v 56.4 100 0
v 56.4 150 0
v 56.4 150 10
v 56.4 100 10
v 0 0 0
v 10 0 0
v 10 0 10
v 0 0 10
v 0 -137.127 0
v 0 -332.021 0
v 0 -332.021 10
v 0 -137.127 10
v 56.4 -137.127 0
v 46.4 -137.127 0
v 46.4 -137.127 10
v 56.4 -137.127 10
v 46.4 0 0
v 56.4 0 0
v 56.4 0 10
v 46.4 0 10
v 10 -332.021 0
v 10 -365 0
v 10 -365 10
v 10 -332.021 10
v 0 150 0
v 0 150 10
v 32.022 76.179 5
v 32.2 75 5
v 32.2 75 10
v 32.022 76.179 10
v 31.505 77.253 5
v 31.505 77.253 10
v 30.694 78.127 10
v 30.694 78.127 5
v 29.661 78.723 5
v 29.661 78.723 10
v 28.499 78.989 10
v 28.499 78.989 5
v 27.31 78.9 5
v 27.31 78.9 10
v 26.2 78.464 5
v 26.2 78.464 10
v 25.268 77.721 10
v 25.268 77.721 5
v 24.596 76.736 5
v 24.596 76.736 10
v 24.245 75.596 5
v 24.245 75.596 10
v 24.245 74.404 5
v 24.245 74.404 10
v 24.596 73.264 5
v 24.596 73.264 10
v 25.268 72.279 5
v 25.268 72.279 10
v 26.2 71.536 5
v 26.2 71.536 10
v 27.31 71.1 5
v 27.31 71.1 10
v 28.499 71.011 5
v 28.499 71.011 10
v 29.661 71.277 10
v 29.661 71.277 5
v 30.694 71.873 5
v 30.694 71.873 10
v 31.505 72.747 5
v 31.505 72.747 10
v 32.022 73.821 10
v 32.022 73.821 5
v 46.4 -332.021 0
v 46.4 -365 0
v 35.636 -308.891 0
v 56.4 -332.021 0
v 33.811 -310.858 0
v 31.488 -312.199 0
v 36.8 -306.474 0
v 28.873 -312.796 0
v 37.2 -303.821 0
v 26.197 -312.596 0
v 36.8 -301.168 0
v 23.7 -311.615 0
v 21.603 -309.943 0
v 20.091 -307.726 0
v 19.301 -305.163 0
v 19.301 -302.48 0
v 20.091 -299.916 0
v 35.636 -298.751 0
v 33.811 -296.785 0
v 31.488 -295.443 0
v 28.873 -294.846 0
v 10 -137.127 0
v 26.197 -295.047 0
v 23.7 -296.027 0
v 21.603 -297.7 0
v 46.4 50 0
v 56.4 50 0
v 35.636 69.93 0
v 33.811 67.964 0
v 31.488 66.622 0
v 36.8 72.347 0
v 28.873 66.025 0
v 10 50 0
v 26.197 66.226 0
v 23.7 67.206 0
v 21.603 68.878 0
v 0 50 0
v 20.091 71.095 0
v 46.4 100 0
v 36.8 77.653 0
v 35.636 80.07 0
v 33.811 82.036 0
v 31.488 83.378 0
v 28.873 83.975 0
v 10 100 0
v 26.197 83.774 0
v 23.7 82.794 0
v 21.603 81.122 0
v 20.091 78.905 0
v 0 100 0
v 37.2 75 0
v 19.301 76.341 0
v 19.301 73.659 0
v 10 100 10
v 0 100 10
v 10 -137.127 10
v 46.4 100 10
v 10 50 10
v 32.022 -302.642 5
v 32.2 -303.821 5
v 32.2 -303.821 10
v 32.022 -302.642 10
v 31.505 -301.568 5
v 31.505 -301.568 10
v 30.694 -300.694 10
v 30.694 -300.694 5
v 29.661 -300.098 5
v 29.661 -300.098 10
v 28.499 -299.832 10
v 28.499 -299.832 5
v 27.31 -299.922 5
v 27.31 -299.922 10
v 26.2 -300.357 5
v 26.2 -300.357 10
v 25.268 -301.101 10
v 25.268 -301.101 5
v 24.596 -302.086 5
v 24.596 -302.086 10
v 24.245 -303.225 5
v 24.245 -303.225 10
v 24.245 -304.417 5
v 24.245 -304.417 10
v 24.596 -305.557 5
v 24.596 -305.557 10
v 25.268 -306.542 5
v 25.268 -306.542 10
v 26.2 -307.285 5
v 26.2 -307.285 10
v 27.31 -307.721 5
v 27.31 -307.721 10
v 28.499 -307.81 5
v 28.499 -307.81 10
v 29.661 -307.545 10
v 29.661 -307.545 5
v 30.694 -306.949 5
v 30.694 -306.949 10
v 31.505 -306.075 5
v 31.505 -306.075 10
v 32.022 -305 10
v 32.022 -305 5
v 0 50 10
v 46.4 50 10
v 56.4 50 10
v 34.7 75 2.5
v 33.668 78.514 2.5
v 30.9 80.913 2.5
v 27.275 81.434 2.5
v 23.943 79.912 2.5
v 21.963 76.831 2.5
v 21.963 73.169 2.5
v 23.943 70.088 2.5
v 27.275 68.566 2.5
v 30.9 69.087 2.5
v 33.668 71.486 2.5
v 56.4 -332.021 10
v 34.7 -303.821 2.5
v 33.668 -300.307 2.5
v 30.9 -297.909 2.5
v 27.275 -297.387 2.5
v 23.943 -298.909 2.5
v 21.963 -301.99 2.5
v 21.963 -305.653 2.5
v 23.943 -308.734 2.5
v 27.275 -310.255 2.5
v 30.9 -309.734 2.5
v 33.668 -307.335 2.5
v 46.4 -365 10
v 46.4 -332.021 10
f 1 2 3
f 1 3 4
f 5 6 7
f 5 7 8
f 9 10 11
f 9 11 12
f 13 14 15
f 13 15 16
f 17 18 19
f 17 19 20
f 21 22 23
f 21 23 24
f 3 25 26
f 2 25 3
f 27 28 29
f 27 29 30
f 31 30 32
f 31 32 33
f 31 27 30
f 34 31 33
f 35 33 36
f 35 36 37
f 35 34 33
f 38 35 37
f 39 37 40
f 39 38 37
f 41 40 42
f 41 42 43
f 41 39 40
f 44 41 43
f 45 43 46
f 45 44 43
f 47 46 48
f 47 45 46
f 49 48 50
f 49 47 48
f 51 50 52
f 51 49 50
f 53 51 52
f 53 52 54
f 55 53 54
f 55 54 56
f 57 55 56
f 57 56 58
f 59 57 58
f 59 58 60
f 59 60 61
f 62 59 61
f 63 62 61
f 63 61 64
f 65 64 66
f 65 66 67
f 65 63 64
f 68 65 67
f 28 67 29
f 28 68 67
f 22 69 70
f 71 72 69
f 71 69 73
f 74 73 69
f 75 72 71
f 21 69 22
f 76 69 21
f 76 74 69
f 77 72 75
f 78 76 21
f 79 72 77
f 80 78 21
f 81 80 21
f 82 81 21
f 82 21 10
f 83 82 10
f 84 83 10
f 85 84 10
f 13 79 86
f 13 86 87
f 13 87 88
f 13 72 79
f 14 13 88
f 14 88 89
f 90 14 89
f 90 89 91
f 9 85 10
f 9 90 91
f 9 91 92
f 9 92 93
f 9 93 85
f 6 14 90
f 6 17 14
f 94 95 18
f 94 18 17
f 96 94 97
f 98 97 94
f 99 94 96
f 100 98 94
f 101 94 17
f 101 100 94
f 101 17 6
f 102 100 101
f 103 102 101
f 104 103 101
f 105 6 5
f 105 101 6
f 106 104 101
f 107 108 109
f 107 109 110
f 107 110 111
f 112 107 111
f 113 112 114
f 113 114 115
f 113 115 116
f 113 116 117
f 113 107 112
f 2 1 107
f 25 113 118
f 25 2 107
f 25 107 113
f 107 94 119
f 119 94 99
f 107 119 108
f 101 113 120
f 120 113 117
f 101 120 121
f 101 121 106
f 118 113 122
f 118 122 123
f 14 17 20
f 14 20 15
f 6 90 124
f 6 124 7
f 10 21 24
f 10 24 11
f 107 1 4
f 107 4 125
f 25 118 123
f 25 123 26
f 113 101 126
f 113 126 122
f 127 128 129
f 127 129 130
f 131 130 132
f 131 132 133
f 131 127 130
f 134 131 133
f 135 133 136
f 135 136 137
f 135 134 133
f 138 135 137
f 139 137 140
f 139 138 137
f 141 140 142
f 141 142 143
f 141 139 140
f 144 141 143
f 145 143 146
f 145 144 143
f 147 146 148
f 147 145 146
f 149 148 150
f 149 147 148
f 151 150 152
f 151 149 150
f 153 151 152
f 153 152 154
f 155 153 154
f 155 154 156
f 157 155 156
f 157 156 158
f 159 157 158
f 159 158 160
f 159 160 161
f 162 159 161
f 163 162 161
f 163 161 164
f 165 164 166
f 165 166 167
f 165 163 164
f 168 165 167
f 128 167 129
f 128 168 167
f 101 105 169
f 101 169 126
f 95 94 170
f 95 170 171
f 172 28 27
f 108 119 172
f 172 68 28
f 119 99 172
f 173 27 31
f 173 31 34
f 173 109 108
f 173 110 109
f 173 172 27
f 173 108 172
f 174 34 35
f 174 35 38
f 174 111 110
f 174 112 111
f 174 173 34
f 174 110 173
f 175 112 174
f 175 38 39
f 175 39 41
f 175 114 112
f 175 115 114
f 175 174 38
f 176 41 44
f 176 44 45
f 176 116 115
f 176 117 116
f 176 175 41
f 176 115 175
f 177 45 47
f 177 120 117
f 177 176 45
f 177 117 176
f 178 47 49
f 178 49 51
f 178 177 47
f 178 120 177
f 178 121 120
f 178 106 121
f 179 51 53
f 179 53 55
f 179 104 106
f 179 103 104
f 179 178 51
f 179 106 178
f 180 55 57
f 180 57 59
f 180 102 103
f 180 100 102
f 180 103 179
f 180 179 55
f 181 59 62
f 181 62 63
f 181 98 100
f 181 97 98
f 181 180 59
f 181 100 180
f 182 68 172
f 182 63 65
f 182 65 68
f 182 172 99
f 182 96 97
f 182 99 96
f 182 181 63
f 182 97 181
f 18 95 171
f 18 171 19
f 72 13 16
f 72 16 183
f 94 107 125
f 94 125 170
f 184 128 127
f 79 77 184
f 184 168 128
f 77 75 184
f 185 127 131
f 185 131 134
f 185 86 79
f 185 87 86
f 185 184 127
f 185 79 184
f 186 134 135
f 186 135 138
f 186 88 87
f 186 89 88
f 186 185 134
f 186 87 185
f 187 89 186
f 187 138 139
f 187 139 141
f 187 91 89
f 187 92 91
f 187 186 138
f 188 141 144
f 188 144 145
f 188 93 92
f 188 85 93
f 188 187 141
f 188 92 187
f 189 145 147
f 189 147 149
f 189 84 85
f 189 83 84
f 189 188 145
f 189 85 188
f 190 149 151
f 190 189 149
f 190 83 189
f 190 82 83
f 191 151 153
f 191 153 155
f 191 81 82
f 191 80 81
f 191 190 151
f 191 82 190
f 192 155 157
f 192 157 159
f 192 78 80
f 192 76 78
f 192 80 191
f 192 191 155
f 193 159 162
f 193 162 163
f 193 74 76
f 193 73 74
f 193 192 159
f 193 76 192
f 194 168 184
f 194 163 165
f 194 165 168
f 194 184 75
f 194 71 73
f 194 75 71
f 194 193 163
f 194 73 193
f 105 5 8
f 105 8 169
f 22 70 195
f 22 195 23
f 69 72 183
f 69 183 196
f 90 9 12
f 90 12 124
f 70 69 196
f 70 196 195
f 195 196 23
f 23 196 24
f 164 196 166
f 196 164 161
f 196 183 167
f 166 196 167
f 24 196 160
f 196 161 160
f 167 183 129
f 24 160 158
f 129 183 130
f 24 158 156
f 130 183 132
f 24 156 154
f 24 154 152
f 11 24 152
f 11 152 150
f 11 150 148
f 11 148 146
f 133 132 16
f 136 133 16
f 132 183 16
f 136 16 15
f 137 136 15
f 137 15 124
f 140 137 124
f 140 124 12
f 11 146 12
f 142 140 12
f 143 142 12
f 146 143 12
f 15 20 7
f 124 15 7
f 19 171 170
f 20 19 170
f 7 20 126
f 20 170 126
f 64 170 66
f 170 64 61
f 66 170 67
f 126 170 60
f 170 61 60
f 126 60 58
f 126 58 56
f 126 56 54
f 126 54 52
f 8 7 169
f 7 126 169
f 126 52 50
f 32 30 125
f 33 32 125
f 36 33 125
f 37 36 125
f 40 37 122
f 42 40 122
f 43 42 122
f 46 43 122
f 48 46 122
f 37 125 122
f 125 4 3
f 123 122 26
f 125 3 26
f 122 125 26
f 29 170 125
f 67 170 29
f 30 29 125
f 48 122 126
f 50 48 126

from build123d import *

# Parameters (mm, degrees)
SKETCH1_R           = 4
BOSS_EXTRUDE1_DEPTH = 10
CHAMFER1_SIZE       = 5


with BuildPart() as part:
    # Sketch1 → Boss-Extrude1 (new body)
    with BuildSketch(Plane.XY):
        Polygon((0, 150), (56.4, 150), (56.4, 100), (46.4, 100), (46.4, 50), (56.4, 50), (56.4, 0), (46.4, 0), (46.4, -137.127452116), (56.4, -137.127452116), (56.4, -332.021266673), (46.4, -332.021266673), (46.4, -365), (10, -365), (10, -332.021266673), (0, -332.021266673), (0, -137.127452116), (10, -137.127452116), (10, 0), (0, 0), (0, 50), (10, 50), (10, 100), (0, 100), align=None)
        with Locations((28.2, 75)):
            Circle(SKETCH1_R, mode=Mode.SUBTRACT)
        with Locations((28.2, -303.821266673)):
            Circle(SKETCH1_R, mode=Mode.SUBTRACT)
    extrude(amount=BOSS_EXTRUDE1_DEPTH)

    # Chamfer1
    chamfer1_edges = [part.edges().sort_by_distance(p)[0] for p in [
        (24.2, 75, 0),
        (24.2, -303.821266673, 0),
    ]]
    chamfer(chamfer1_edges, length=CHAMFER1_SIZE)


solid = part.part
